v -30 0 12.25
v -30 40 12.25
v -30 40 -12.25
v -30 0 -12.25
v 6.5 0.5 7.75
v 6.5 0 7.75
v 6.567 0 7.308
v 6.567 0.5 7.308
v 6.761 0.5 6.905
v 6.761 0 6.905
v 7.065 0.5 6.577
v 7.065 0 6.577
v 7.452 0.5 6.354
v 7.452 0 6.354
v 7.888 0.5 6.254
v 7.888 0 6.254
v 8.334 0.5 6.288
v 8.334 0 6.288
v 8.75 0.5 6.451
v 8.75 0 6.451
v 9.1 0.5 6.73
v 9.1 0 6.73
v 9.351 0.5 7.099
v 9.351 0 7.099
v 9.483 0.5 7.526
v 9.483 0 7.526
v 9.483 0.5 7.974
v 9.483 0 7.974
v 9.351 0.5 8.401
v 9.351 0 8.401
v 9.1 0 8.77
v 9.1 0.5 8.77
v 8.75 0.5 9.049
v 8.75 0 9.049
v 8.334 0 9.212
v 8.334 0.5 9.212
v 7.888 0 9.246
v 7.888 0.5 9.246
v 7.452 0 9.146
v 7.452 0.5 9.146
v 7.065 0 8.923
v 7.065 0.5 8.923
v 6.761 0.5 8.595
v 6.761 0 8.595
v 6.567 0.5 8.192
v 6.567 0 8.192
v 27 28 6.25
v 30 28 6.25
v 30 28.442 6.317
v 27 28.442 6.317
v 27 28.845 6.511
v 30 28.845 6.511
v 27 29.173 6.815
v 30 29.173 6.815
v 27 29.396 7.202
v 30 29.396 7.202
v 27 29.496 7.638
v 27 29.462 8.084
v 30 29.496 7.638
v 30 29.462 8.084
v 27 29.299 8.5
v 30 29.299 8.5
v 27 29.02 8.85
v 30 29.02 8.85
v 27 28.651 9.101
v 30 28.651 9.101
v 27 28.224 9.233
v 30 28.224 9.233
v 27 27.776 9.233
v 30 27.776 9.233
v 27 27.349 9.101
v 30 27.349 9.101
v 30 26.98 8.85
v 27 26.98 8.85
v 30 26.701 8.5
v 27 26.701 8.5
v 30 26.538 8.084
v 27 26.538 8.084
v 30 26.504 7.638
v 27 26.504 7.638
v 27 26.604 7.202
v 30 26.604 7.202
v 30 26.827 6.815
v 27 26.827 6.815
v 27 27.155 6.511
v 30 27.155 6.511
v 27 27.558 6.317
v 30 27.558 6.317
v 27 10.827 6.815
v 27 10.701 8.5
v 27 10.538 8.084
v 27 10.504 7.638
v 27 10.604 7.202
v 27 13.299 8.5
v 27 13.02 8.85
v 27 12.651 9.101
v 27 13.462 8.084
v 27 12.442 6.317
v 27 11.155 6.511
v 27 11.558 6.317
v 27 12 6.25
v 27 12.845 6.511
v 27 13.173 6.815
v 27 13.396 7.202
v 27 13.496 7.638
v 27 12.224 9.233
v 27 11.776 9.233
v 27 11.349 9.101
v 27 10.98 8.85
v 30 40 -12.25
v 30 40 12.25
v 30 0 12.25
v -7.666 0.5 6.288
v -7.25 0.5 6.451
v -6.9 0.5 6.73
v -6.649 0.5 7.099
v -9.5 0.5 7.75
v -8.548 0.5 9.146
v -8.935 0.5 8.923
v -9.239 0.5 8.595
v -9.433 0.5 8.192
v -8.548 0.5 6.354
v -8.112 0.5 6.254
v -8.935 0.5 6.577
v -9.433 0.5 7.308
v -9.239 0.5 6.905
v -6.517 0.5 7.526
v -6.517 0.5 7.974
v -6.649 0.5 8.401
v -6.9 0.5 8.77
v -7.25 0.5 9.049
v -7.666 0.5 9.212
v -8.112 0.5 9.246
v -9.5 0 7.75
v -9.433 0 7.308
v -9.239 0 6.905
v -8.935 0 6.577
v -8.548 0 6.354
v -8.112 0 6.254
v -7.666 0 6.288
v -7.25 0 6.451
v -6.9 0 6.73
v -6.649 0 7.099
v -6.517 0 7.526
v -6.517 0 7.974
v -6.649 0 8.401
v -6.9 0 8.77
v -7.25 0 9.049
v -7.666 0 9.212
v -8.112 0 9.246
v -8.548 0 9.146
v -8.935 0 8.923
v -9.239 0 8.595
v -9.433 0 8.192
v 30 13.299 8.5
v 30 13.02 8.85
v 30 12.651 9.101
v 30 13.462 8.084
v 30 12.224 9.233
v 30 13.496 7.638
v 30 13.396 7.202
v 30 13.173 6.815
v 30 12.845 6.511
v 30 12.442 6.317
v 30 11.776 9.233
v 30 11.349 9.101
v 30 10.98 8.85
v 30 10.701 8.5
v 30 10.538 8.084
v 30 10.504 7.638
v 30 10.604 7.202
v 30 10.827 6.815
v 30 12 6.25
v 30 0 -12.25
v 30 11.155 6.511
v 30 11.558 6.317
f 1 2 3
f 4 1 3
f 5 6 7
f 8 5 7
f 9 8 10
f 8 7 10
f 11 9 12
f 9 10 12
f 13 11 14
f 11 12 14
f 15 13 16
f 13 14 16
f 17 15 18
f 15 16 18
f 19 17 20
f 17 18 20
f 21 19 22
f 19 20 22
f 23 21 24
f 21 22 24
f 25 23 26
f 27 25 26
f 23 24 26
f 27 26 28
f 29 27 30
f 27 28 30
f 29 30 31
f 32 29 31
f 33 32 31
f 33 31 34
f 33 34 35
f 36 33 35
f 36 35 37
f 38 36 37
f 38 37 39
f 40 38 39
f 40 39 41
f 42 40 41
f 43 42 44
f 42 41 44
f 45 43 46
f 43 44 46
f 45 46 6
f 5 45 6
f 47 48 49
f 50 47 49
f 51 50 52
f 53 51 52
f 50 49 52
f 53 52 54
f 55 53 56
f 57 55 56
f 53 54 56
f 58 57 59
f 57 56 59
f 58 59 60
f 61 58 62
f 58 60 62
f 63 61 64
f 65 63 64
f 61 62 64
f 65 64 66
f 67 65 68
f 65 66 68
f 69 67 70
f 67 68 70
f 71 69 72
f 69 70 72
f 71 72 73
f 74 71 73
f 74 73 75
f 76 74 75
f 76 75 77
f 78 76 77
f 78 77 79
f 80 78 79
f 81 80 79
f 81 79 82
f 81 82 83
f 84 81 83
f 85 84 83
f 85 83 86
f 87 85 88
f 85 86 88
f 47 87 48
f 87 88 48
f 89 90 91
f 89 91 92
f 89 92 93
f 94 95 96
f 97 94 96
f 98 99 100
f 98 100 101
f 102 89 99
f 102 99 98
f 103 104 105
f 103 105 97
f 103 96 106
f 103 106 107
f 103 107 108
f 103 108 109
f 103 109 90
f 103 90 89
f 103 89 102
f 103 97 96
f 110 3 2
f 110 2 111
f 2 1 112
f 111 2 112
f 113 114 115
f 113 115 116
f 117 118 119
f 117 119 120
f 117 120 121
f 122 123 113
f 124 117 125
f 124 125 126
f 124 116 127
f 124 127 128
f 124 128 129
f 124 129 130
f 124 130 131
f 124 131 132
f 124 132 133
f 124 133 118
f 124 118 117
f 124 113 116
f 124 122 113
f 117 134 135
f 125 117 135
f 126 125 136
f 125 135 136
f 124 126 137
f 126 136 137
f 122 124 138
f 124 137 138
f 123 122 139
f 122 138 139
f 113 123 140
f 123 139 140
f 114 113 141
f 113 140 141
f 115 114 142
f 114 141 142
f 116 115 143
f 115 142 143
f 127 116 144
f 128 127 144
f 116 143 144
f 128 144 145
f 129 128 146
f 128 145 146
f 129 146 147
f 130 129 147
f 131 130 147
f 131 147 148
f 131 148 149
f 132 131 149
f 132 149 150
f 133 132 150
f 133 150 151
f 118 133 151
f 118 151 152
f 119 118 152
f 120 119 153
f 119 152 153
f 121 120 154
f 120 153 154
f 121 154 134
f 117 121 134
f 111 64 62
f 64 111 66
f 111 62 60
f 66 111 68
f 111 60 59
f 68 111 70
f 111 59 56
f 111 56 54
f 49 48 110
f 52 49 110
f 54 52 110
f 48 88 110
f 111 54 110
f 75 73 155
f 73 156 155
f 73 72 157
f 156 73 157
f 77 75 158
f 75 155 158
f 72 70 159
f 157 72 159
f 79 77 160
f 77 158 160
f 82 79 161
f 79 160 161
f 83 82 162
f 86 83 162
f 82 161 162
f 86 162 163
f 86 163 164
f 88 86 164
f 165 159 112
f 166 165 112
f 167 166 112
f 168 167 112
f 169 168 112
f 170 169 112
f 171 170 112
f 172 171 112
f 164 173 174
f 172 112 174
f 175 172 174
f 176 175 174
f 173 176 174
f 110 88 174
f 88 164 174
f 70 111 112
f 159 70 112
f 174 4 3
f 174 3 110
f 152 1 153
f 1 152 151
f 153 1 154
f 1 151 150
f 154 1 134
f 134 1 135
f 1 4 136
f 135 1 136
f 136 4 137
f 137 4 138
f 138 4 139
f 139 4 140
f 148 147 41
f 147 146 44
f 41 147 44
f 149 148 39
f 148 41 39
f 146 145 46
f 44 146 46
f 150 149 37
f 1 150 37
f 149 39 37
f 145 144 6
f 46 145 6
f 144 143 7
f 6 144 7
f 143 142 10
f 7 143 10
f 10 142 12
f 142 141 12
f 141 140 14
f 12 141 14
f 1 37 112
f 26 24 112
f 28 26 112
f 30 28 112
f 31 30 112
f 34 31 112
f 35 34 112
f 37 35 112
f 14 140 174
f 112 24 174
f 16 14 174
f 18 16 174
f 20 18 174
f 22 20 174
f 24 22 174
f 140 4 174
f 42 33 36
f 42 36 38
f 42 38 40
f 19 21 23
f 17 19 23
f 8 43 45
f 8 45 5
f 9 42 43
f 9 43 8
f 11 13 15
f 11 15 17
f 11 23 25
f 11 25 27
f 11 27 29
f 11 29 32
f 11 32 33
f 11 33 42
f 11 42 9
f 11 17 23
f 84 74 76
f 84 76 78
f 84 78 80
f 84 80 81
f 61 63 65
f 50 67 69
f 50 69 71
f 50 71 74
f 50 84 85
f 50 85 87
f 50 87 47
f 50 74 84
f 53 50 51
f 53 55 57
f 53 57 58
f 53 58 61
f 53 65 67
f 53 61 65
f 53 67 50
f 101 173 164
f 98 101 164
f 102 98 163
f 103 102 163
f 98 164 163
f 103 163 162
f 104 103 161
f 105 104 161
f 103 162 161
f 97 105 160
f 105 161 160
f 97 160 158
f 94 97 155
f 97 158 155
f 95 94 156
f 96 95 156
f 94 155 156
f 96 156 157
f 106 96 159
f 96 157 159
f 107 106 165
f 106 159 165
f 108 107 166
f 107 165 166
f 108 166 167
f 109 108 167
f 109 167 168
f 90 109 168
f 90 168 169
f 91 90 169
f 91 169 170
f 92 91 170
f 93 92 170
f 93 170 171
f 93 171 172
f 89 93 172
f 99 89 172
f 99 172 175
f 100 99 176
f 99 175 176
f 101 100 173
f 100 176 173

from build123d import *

# Parameters (mm, degrees)
SKETCH_1_W          = 60
SKETCH_1_H          = 24.5
EXTRUDE_1_DEPTH     = 40
SKETCH_2_R          = 1.5
CUT_EXTRUDE_1_DEPTH = 0.5
SKETCH_3_R          = 1.5
CUT_EXTRUDE_2_DEPTH = 3


with BuildPart() as part:
    # 草图1 → 凸台-拉伸1 (new body)
    with BuildSketch(Plane(origin=(0, 0, 0), x_dir=(1, 0, 0), z_dir=(0, 1, 0))):
        Rectangle(SKETCH_1_W, SKETCH_1_H)
    extrude(amount=EXTRUDE_1_DEPTH)

    # 草图2 → 切除-拉伸1 (cut)
    with BuildSketch(Plane(origin=(0, 0, 0), x_dir=(-1, 0, 0), z_dir=(0, -1, 0))):
        with Locations((8, -7.75)):
            Circle(SKETCH_2_R)
        with Locations((-8, -7.75)):
            Circle(SKETCH_2_R)
    extrude(amount=-CUT_EXTRUDE_1_DEPTH, mode=Mode.SUBTRACT)

    # 草图3 → 切除-拉伸2 (cut)
    with BuildSketch(Plane(origin=(30, 0, 0), x_dir=(0, 0, -1), z_dir=(1, 0, 0))):
        with Locations((-7.75, 28)):
            Circle(SKETCH_3_R)
        with Locations((-7.75, 12)):
            Circle(SKETCH_3_R)
    extrude(amount=-CUT_EXTRUDE_2_DEPTH, mode=Mode.SUBTRACT)


solid = part.part
